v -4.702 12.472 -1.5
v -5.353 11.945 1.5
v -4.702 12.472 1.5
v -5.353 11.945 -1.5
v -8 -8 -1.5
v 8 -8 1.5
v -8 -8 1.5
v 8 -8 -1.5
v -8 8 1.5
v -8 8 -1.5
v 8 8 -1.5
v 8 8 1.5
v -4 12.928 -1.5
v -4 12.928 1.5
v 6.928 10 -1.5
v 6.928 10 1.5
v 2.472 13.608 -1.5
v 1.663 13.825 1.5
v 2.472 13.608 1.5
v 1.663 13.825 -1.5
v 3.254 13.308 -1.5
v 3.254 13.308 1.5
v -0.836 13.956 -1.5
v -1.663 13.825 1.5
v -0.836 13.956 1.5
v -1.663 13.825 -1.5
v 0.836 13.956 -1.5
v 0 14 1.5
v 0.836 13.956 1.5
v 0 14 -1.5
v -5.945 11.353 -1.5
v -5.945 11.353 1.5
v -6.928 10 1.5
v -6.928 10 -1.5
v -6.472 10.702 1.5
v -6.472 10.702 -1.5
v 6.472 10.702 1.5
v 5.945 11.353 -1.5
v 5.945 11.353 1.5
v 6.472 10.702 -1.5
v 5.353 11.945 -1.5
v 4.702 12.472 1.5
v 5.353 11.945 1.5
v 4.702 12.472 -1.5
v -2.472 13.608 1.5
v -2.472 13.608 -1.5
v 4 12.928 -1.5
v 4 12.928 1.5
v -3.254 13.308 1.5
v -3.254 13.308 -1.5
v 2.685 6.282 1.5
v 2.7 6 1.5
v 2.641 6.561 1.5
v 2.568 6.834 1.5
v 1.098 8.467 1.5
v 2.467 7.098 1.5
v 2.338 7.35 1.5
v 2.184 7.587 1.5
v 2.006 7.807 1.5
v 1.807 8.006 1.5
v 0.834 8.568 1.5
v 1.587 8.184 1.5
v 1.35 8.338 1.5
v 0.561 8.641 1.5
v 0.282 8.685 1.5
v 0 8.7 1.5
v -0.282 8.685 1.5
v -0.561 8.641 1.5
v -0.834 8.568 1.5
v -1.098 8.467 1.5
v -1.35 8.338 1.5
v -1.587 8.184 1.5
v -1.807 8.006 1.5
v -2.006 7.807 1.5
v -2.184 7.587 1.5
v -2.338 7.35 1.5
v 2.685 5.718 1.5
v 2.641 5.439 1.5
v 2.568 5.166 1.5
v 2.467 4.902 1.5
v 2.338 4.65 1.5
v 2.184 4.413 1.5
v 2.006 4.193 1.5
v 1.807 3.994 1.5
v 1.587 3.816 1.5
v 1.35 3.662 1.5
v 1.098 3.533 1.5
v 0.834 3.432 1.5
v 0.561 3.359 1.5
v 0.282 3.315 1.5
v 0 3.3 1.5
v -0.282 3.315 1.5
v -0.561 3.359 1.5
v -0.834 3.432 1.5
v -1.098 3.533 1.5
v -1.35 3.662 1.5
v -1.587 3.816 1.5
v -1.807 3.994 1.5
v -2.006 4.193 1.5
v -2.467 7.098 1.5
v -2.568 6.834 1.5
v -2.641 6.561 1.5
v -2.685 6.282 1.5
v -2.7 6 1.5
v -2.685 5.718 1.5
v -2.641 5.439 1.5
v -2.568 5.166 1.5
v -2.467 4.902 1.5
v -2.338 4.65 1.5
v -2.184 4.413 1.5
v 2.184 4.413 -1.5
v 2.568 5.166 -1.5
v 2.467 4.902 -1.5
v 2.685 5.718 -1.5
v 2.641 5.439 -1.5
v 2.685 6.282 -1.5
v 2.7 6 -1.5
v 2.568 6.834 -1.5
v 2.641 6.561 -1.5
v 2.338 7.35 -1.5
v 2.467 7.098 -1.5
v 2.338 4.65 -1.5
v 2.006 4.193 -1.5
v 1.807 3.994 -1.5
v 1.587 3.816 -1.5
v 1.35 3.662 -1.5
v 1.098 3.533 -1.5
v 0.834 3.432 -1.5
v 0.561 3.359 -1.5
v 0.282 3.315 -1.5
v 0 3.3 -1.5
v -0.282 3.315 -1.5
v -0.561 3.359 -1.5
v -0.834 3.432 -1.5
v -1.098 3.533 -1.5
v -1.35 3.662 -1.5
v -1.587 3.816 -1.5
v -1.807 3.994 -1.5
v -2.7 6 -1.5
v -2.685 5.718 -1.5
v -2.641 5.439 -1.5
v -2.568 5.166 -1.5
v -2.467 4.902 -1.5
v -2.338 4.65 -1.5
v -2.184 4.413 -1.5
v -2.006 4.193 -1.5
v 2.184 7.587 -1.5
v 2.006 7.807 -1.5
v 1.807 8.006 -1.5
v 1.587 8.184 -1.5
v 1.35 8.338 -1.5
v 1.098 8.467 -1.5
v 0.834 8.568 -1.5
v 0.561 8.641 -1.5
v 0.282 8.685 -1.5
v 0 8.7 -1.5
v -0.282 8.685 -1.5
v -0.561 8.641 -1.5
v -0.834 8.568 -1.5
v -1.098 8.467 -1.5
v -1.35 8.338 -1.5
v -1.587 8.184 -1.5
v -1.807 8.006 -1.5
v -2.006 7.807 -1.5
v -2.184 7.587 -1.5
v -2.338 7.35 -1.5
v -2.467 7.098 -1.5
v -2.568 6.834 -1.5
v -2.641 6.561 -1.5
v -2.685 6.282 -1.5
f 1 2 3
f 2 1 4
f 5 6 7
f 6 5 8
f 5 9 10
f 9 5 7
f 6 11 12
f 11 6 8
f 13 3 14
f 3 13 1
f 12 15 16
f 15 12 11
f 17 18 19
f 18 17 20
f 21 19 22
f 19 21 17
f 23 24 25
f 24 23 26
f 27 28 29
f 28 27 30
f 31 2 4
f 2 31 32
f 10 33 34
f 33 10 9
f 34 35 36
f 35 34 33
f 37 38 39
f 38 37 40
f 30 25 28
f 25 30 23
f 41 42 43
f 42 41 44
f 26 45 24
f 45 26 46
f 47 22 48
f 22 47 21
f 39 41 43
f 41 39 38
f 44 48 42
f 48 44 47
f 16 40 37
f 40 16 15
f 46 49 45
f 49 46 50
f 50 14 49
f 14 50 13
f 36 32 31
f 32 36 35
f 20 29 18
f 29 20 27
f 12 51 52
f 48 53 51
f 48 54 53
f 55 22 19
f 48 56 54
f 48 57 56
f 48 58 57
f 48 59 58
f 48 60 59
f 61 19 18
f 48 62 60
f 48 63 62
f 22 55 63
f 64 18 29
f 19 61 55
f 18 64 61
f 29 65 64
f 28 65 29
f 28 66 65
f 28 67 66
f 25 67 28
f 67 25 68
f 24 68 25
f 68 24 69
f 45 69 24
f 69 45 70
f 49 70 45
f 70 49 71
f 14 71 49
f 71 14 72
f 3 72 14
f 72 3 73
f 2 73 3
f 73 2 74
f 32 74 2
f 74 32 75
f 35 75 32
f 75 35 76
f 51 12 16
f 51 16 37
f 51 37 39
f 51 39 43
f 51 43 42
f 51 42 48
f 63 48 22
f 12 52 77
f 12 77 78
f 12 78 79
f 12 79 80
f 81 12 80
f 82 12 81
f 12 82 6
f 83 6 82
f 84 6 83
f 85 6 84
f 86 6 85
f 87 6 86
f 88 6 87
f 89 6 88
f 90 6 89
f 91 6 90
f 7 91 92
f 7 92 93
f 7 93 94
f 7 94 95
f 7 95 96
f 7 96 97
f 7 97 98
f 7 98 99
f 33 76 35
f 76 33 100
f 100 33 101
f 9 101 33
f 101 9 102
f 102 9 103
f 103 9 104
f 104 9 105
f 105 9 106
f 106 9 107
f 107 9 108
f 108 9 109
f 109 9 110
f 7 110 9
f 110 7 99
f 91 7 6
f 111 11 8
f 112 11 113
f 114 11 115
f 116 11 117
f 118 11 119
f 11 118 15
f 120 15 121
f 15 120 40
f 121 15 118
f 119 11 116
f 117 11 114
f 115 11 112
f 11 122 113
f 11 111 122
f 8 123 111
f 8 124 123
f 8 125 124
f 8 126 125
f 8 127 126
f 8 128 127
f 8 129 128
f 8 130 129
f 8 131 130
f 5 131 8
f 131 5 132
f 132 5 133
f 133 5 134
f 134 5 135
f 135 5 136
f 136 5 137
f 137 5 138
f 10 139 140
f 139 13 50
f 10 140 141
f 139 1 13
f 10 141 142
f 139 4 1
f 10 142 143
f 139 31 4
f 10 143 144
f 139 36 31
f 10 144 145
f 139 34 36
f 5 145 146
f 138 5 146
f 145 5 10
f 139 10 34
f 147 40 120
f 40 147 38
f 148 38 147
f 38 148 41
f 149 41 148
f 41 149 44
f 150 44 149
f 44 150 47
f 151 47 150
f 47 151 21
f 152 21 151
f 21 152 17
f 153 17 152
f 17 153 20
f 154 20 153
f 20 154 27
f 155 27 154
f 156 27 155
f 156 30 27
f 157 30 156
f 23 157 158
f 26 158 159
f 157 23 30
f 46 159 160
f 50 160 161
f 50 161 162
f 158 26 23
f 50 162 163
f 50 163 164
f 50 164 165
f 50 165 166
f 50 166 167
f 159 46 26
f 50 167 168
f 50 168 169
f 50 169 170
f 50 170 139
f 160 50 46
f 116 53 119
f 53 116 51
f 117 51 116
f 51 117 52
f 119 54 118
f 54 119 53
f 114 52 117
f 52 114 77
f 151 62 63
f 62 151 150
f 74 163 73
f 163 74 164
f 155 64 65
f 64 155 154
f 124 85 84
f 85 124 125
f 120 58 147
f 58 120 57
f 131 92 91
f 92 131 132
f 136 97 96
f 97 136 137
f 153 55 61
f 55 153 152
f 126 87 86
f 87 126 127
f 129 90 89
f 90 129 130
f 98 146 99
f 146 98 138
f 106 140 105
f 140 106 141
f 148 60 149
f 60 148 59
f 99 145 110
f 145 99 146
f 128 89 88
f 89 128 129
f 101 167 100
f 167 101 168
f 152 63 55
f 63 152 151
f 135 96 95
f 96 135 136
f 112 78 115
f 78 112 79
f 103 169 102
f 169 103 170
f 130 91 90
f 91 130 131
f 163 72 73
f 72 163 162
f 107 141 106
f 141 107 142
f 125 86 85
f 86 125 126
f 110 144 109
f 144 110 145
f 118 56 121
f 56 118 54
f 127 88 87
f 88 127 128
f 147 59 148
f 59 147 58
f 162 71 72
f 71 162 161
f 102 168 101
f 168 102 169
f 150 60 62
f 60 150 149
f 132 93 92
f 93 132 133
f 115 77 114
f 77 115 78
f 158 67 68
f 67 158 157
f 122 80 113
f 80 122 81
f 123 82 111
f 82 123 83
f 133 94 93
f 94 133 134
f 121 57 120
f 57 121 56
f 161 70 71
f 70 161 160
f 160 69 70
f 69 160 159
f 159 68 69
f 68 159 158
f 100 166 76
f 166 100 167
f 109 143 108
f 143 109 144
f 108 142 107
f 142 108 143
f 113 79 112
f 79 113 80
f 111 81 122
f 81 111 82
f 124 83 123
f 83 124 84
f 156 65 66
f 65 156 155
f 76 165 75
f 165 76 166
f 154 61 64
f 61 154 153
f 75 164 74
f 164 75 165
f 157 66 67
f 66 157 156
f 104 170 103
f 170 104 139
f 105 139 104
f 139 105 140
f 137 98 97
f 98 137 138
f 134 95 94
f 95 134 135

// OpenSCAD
// Single-hole mounting tab.
$fn = 60;
eps = 0.02;
tab_w = 16;
tab_h = 28;
tab_t = 3;
difference() {
    hull() { translate([0,0,0]) cube([tab_w,tab_w,tab_t],center=true); translate([0,tab_h/2-tab_w/2,0]) cylinder(d=tab_w,h=tab_t,center=true); }
    translate([0,tab_h/2-tab_w/2,-tab_t/2-eps]) cylinder(d=5.4,h=tab_t+2*eps);
}
